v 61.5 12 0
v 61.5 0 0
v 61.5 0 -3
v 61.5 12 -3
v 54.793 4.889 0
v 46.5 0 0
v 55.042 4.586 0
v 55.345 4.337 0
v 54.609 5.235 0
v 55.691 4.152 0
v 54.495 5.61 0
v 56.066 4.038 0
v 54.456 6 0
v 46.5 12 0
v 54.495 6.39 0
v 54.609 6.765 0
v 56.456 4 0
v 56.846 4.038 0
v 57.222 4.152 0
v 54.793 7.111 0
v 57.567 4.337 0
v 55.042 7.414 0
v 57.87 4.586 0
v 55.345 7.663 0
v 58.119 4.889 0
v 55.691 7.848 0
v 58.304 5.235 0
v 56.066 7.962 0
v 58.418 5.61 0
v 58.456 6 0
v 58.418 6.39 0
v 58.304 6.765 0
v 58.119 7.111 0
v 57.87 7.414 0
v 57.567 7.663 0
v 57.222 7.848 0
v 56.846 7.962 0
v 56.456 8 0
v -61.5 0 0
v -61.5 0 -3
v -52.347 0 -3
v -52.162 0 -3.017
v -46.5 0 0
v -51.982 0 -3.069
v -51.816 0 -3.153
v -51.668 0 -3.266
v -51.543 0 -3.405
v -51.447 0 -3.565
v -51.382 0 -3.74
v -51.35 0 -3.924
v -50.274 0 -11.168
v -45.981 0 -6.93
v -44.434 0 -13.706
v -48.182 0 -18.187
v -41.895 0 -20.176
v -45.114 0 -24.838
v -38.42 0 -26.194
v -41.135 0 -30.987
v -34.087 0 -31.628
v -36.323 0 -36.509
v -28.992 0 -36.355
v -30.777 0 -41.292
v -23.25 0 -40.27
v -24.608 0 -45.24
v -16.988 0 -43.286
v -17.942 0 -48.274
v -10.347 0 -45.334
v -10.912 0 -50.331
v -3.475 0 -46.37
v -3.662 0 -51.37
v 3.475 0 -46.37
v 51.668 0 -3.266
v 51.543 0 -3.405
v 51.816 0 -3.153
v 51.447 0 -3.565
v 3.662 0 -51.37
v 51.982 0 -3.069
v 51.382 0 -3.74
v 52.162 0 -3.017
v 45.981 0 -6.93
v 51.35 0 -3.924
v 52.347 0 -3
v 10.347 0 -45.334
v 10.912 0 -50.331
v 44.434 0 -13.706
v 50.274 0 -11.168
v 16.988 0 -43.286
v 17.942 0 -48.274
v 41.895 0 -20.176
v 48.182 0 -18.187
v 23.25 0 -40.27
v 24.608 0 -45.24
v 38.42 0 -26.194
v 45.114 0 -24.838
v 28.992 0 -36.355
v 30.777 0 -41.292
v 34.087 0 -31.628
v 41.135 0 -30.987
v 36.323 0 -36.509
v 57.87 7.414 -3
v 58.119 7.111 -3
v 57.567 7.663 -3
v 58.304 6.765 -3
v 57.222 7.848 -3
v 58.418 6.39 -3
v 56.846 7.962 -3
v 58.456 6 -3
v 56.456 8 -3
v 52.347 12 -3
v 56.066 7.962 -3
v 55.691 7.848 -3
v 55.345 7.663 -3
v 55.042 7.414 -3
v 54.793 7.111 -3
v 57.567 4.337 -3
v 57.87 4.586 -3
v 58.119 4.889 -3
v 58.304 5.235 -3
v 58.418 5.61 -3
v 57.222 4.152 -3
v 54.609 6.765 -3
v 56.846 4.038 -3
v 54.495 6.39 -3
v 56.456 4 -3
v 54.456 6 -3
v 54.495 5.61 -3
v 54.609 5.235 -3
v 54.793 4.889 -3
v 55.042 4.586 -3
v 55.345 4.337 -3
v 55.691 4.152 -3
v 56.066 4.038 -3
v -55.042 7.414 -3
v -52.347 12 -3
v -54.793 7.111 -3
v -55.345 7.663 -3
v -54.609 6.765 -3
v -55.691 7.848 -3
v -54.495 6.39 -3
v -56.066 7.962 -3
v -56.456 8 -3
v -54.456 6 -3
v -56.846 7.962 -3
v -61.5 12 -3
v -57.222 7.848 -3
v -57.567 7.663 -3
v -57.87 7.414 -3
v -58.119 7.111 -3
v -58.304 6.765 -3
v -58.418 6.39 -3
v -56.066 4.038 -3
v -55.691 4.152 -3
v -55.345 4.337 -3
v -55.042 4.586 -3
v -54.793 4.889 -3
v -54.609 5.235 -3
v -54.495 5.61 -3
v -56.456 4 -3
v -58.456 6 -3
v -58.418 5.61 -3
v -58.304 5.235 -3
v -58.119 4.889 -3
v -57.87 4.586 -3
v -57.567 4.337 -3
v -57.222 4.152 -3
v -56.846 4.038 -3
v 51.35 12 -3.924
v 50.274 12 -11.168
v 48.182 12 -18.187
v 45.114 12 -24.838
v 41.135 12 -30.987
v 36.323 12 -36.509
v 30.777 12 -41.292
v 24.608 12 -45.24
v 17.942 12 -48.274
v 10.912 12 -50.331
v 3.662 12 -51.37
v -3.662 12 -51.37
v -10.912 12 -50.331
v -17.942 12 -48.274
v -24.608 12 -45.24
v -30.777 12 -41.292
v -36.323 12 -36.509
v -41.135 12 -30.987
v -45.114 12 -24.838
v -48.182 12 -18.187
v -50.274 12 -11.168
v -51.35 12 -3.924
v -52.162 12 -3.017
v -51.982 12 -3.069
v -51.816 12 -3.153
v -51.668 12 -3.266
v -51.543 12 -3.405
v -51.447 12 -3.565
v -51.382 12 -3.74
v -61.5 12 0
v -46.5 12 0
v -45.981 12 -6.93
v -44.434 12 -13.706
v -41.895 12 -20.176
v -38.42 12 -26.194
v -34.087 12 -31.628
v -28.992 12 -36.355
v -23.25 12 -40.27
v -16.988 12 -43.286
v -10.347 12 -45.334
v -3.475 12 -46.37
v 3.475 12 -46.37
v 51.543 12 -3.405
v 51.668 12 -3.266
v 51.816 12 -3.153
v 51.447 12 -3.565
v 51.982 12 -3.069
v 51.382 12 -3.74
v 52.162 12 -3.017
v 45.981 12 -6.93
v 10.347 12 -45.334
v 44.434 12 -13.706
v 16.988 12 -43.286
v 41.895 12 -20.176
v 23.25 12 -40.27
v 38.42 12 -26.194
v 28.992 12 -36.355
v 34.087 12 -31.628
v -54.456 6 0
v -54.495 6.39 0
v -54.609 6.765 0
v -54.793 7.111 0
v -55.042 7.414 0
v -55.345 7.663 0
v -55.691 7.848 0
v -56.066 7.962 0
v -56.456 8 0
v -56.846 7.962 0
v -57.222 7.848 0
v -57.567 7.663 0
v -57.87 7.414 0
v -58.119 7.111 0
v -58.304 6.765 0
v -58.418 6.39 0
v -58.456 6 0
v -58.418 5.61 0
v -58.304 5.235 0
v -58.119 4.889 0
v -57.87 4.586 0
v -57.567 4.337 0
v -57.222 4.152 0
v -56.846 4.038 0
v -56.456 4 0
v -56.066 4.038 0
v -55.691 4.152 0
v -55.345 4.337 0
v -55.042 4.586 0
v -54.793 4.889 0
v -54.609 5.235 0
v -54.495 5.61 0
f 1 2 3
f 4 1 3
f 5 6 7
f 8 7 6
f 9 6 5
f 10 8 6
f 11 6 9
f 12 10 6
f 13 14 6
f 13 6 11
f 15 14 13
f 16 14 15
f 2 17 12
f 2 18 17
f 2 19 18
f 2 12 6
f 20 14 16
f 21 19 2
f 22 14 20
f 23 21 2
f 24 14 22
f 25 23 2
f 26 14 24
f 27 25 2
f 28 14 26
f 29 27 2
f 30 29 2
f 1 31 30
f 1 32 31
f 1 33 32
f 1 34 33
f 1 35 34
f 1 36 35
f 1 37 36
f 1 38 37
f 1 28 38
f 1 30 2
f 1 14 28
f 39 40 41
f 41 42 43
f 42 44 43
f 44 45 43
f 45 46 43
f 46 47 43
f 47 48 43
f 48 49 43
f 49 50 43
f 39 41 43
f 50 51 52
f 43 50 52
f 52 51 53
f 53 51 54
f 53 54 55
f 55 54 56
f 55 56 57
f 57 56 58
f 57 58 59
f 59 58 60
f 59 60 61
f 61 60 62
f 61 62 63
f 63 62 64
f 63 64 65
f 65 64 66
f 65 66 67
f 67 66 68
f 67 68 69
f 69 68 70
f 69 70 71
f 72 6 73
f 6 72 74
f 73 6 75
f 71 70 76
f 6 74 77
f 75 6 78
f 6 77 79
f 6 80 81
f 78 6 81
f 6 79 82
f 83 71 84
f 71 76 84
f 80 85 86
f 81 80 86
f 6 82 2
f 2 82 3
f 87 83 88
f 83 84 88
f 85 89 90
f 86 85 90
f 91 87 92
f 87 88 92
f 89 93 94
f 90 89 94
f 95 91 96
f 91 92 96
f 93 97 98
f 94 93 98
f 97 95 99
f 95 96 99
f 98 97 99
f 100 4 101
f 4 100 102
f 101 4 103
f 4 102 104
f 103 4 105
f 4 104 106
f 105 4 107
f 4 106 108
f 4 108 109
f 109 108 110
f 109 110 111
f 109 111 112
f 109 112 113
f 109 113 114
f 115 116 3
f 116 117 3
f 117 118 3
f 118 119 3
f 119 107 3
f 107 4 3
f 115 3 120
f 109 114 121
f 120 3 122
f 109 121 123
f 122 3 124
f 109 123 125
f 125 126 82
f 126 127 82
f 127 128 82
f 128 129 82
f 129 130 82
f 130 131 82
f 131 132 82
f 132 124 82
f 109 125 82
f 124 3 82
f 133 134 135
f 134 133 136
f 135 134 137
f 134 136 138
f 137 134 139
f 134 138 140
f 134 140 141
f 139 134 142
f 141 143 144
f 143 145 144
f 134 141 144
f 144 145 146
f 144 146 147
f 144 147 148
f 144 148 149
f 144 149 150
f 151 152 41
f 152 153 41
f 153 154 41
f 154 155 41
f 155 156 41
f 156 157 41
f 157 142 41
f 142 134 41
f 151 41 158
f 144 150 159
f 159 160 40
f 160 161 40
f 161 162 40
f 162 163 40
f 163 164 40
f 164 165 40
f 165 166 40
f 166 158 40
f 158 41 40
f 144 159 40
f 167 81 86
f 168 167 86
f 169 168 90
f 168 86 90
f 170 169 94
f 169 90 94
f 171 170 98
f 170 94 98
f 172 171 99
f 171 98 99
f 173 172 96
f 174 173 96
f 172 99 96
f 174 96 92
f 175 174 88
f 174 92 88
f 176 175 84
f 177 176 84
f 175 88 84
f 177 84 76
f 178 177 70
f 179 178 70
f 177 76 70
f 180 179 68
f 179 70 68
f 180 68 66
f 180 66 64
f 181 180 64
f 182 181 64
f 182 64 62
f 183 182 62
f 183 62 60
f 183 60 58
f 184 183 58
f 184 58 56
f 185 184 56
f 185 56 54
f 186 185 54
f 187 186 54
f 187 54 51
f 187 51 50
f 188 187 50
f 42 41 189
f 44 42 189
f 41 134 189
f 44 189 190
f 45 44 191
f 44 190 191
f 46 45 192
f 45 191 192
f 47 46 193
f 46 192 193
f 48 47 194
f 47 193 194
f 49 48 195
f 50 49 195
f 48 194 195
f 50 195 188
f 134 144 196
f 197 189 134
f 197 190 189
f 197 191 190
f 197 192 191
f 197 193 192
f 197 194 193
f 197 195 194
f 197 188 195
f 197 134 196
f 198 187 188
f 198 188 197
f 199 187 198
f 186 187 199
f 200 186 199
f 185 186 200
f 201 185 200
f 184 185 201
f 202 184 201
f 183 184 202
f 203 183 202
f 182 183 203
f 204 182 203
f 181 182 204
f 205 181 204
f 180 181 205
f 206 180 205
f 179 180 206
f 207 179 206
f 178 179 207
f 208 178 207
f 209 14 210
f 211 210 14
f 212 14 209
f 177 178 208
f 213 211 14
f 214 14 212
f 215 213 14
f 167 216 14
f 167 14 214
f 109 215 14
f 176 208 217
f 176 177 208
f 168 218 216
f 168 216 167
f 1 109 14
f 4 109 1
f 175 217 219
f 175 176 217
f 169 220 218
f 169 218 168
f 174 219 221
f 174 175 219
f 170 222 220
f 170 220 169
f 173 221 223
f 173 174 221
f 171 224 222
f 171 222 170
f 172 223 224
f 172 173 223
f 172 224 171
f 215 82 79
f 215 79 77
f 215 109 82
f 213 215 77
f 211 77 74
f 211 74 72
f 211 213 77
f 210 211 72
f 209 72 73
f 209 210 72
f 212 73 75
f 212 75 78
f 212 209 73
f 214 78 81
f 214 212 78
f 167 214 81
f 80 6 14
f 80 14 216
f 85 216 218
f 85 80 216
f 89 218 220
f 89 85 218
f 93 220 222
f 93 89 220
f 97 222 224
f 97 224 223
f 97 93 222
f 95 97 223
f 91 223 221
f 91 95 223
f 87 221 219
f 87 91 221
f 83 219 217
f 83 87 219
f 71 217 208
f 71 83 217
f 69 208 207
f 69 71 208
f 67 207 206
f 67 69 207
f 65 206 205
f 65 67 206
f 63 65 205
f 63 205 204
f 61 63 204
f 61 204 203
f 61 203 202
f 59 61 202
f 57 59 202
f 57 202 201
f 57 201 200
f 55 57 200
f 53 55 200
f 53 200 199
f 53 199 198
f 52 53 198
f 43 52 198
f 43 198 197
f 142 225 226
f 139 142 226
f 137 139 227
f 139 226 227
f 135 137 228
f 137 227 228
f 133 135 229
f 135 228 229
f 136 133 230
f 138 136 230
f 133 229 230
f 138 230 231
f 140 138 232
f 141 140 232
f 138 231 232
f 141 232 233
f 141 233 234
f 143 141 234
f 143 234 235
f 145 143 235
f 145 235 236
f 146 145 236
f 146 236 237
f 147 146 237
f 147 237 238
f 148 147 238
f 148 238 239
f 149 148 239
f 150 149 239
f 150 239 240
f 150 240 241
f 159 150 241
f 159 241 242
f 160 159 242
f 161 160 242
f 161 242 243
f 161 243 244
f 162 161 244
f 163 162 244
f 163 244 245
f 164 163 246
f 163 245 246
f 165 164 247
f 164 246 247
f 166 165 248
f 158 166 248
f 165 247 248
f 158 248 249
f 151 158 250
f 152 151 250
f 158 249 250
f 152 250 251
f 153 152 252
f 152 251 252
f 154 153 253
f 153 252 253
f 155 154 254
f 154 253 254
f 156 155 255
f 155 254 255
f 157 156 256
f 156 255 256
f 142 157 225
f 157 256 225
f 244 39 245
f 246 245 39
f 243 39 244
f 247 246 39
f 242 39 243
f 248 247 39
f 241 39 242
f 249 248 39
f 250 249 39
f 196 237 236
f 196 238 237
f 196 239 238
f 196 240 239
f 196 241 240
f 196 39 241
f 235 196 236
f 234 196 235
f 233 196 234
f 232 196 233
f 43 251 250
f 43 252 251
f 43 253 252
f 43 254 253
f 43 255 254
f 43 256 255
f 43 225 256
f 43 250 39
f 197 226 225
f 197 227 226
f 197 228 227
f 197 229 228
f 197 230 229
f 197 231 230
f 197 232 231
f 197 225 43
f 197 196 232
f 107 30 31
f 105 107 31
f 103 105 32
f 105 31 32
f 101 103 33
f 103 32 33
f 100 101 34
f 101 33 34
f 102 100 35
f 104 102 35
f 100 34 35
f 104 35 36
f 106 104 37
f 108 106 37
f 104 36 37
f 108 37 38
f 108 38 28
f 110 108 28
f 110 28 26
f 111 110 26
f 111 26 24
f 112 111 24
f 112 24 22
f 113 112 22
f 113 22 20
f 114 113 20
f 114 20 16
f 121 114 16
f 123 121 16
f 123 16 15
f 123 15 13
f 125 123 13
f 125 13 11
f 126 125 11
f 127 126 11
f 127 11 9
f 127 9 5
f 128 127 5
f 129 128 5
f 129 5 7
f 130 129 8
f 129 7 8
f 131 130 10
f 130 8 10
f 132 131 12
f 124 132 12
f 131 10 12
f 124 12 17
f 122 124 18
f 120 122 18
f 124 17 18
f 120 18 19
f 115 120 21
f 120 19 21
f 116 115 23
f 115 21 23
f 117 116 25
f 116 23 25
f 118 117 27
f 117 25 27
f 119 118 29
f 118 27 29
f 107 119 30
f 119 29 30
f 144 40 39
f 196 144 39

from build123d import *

# Parameters (mm, degrees)
SKETCH1_R           = 46.5
BOSS_EXTRUDE1_DEPTH = 12
SKETCH2_R           = 2
CUT_EXTRUDE1_DEPTH  = 12
SKETCH3_W           = 95
SKETCH3_H           = 5
BOSS_EXTRUDE2_DEPTH = 12
MOVE_FACE1_BY       = 3
MOVE_FACE2_BY       = 3
MOVE_FACE2_2_BY     = 3
SKETCH4_R           = 2
CUT_EXTRUDE2_DEPTH  = 114.80355882
CUT_EXTRUDE3_DEPTH  = 2
FILLET1_R           = 1
FILLET2_R           = 1


with BuildPart() as part:
    # Sketch1 → Boss-Extrude1 (new body)
    with BuildSketch(Plane(origin=(0, 0, 0), x_dir=(1, 0, 0), z_dir=(0, 1, 0))):
        with BuildLine():
            Line((61.5, -3), (61.5, 3))
            Line((61.5, 3), (51.412547107, 3))
            ThreePointArc((51.412547107, 3), (0, 51.5), (-51.412547107, 3))
            Line((-51.412547107, 3), (-61.5, 3))
            Line((-61.5, 3), (-61.5, -3))
            Line((-61.5, -3), (-51.412547107, -3))
            ThreePointArc((-51.412547107, -3), (0, -51.5), (51.412547107, -3))
            Line((51.412547107, -3), (61.5, -3))
        make_face()
        with Locations(Location((0, 0, 0), (0, 0, 270))):
            Circle(SKETCH1_R, mode=Mode.SUBTRACT)
    extrude(amount=BOSS_EXTRUDE1_DEPTH)

    # Sketch2 → Cut-Extrude1 (cut)
    with BuildSketch(Plane.XY.offset(3)):
        with Locations((56.456273553, 6)):
            Circle(SKETCH2_R)
        with Locations((-56.456273553, 6)):
            Circle(SKETCH2_R)
    extrude(amount=-CUT_EXTRUDE1_DEPTH, mode=Mode.SUBTRACT)


with BuildPart() as body_2:
    # Split1: the piece on the far side of the plane
    add(part.part)
    split(bisect_by=Plane.XY, keep=Keep.BOTTOM)

    # Fillet2
    fillet2_edges = [body_2.edges().sort_by_distance(p)[0] for p in [
        (51.412547107, 6, -3),
        (-51.412547107, 6, -3),
    ]]
    fillet(fillet2_edges, radius=FILLET2_R)


with BuildPart() as part_1:
    add(part.part)

    # Split1
    split(bisect_by=Plane.XY, keep=Keep.TOP)

    # Sketch3 → Boss-Extrude2 (add)
    with BuildSketch(Plane(origin=(0, 12, 0), x_dir=(1, 0, 0), z_dir=(0, 1, 0))):
        with Locations((0, -49)):
            Rectangle(SKETCH3_W, SKETCH3_H)
    extrude(amount=-BOSS_EXTRUDE2_DEPTH)

    # Move Face1: a face moved inward by 3.0
    extrude(part_1.faces().sort_by_distance((0, 6, 51.5))[0], amount=MOVE_FACE1_BY, dir=(0, 0, -1), mode=Mode.SUBTRACT)

    # Move Face2: a face moved outward by 3.0
    extrude(part_1.faces().sort_by_distance((34.817971811, 6, 46.5))[0], amount=MOVE_FACE2_BY, dir=(0, 0, -1))

    # Move Face2 2: a face moved outward by 3.0
    extrude(part_1.faces().sort_by_distance((-34.817971811, 6, 46.5))[0], amount=MOVE_FACE2_2_BY, dir=(0, 0, -1))

    # Sketch4 → Cut-Extrude2 (cut, through all)
    with BuildSketch(Plane(origin=(0, 0, 43.5), x_dir=(-1, 0, 0), z_dir=(0, 0, -1))):
        with Locations((44.5, 6)):
            Circle(SKETCH4_R)
    cut_extrude2 = extrude(amount=-CUT_EXTRUDE2_DEPTH, mode=Mode.SUBTRACT)

    # Sketch5 → Cut-Extrude3 (cut)
    with BuildSketch(Plane(origin=(0, 0, 43.5), x_dir=(-1, 0, 0), z_dir=(0, 0, -1))):
        with BuildLine():
            Line((47.5, 12), (42.69457877, 9.569377282))
            ThreePointArc((42.69457877, 9.569377282), (40.5, 6), (42.69457877, 2.430622718))
            Line((42.69457877, 2.430622718), (47.5, 0))
            Line((47.5, 0), (47.5, 12))
        make_face()
    cut_extrude3 = extrude(amount=-CUT_EXTRUDE3_DEPTH, mode=Mode.SUBTRACT)

    # Mirror1: Cut-Extrude2, Cut-Extrude3 across plane
    add(cut_extrude2.mirror(Plane(origin=(0, 0, 0), x_dir=(0, 0, 1), z_dir=(1, 0, 0))), mode=Mode.SUBTRACT)
    add(cut_extrude3.mirror(Plane(origin=(0, 0, 0), x_dir=(0, 0, 1), z_dir=(1, 0, 0))), mode=Mode.SUBTRACT)

    # Fillet1
    fillet1_edges = [part_1.edges().sort_by_distance(p)[0] for p in [
        (47.5, 0, 44.5),
        (47.5, 12, 44.5),
        (51.412547107, 6, 3),
        (-51.412547107, 6, 3),
        (27.568097504, 6, 43.5),
        (-47.5, 0, 44.5),
        (-27.568097504, 6, 43.5),
        (-47.5, 12, 44.5),
    ]]
    fillet(fillet1_edges, radius=FILLET1_R)


solid = body_2.part
